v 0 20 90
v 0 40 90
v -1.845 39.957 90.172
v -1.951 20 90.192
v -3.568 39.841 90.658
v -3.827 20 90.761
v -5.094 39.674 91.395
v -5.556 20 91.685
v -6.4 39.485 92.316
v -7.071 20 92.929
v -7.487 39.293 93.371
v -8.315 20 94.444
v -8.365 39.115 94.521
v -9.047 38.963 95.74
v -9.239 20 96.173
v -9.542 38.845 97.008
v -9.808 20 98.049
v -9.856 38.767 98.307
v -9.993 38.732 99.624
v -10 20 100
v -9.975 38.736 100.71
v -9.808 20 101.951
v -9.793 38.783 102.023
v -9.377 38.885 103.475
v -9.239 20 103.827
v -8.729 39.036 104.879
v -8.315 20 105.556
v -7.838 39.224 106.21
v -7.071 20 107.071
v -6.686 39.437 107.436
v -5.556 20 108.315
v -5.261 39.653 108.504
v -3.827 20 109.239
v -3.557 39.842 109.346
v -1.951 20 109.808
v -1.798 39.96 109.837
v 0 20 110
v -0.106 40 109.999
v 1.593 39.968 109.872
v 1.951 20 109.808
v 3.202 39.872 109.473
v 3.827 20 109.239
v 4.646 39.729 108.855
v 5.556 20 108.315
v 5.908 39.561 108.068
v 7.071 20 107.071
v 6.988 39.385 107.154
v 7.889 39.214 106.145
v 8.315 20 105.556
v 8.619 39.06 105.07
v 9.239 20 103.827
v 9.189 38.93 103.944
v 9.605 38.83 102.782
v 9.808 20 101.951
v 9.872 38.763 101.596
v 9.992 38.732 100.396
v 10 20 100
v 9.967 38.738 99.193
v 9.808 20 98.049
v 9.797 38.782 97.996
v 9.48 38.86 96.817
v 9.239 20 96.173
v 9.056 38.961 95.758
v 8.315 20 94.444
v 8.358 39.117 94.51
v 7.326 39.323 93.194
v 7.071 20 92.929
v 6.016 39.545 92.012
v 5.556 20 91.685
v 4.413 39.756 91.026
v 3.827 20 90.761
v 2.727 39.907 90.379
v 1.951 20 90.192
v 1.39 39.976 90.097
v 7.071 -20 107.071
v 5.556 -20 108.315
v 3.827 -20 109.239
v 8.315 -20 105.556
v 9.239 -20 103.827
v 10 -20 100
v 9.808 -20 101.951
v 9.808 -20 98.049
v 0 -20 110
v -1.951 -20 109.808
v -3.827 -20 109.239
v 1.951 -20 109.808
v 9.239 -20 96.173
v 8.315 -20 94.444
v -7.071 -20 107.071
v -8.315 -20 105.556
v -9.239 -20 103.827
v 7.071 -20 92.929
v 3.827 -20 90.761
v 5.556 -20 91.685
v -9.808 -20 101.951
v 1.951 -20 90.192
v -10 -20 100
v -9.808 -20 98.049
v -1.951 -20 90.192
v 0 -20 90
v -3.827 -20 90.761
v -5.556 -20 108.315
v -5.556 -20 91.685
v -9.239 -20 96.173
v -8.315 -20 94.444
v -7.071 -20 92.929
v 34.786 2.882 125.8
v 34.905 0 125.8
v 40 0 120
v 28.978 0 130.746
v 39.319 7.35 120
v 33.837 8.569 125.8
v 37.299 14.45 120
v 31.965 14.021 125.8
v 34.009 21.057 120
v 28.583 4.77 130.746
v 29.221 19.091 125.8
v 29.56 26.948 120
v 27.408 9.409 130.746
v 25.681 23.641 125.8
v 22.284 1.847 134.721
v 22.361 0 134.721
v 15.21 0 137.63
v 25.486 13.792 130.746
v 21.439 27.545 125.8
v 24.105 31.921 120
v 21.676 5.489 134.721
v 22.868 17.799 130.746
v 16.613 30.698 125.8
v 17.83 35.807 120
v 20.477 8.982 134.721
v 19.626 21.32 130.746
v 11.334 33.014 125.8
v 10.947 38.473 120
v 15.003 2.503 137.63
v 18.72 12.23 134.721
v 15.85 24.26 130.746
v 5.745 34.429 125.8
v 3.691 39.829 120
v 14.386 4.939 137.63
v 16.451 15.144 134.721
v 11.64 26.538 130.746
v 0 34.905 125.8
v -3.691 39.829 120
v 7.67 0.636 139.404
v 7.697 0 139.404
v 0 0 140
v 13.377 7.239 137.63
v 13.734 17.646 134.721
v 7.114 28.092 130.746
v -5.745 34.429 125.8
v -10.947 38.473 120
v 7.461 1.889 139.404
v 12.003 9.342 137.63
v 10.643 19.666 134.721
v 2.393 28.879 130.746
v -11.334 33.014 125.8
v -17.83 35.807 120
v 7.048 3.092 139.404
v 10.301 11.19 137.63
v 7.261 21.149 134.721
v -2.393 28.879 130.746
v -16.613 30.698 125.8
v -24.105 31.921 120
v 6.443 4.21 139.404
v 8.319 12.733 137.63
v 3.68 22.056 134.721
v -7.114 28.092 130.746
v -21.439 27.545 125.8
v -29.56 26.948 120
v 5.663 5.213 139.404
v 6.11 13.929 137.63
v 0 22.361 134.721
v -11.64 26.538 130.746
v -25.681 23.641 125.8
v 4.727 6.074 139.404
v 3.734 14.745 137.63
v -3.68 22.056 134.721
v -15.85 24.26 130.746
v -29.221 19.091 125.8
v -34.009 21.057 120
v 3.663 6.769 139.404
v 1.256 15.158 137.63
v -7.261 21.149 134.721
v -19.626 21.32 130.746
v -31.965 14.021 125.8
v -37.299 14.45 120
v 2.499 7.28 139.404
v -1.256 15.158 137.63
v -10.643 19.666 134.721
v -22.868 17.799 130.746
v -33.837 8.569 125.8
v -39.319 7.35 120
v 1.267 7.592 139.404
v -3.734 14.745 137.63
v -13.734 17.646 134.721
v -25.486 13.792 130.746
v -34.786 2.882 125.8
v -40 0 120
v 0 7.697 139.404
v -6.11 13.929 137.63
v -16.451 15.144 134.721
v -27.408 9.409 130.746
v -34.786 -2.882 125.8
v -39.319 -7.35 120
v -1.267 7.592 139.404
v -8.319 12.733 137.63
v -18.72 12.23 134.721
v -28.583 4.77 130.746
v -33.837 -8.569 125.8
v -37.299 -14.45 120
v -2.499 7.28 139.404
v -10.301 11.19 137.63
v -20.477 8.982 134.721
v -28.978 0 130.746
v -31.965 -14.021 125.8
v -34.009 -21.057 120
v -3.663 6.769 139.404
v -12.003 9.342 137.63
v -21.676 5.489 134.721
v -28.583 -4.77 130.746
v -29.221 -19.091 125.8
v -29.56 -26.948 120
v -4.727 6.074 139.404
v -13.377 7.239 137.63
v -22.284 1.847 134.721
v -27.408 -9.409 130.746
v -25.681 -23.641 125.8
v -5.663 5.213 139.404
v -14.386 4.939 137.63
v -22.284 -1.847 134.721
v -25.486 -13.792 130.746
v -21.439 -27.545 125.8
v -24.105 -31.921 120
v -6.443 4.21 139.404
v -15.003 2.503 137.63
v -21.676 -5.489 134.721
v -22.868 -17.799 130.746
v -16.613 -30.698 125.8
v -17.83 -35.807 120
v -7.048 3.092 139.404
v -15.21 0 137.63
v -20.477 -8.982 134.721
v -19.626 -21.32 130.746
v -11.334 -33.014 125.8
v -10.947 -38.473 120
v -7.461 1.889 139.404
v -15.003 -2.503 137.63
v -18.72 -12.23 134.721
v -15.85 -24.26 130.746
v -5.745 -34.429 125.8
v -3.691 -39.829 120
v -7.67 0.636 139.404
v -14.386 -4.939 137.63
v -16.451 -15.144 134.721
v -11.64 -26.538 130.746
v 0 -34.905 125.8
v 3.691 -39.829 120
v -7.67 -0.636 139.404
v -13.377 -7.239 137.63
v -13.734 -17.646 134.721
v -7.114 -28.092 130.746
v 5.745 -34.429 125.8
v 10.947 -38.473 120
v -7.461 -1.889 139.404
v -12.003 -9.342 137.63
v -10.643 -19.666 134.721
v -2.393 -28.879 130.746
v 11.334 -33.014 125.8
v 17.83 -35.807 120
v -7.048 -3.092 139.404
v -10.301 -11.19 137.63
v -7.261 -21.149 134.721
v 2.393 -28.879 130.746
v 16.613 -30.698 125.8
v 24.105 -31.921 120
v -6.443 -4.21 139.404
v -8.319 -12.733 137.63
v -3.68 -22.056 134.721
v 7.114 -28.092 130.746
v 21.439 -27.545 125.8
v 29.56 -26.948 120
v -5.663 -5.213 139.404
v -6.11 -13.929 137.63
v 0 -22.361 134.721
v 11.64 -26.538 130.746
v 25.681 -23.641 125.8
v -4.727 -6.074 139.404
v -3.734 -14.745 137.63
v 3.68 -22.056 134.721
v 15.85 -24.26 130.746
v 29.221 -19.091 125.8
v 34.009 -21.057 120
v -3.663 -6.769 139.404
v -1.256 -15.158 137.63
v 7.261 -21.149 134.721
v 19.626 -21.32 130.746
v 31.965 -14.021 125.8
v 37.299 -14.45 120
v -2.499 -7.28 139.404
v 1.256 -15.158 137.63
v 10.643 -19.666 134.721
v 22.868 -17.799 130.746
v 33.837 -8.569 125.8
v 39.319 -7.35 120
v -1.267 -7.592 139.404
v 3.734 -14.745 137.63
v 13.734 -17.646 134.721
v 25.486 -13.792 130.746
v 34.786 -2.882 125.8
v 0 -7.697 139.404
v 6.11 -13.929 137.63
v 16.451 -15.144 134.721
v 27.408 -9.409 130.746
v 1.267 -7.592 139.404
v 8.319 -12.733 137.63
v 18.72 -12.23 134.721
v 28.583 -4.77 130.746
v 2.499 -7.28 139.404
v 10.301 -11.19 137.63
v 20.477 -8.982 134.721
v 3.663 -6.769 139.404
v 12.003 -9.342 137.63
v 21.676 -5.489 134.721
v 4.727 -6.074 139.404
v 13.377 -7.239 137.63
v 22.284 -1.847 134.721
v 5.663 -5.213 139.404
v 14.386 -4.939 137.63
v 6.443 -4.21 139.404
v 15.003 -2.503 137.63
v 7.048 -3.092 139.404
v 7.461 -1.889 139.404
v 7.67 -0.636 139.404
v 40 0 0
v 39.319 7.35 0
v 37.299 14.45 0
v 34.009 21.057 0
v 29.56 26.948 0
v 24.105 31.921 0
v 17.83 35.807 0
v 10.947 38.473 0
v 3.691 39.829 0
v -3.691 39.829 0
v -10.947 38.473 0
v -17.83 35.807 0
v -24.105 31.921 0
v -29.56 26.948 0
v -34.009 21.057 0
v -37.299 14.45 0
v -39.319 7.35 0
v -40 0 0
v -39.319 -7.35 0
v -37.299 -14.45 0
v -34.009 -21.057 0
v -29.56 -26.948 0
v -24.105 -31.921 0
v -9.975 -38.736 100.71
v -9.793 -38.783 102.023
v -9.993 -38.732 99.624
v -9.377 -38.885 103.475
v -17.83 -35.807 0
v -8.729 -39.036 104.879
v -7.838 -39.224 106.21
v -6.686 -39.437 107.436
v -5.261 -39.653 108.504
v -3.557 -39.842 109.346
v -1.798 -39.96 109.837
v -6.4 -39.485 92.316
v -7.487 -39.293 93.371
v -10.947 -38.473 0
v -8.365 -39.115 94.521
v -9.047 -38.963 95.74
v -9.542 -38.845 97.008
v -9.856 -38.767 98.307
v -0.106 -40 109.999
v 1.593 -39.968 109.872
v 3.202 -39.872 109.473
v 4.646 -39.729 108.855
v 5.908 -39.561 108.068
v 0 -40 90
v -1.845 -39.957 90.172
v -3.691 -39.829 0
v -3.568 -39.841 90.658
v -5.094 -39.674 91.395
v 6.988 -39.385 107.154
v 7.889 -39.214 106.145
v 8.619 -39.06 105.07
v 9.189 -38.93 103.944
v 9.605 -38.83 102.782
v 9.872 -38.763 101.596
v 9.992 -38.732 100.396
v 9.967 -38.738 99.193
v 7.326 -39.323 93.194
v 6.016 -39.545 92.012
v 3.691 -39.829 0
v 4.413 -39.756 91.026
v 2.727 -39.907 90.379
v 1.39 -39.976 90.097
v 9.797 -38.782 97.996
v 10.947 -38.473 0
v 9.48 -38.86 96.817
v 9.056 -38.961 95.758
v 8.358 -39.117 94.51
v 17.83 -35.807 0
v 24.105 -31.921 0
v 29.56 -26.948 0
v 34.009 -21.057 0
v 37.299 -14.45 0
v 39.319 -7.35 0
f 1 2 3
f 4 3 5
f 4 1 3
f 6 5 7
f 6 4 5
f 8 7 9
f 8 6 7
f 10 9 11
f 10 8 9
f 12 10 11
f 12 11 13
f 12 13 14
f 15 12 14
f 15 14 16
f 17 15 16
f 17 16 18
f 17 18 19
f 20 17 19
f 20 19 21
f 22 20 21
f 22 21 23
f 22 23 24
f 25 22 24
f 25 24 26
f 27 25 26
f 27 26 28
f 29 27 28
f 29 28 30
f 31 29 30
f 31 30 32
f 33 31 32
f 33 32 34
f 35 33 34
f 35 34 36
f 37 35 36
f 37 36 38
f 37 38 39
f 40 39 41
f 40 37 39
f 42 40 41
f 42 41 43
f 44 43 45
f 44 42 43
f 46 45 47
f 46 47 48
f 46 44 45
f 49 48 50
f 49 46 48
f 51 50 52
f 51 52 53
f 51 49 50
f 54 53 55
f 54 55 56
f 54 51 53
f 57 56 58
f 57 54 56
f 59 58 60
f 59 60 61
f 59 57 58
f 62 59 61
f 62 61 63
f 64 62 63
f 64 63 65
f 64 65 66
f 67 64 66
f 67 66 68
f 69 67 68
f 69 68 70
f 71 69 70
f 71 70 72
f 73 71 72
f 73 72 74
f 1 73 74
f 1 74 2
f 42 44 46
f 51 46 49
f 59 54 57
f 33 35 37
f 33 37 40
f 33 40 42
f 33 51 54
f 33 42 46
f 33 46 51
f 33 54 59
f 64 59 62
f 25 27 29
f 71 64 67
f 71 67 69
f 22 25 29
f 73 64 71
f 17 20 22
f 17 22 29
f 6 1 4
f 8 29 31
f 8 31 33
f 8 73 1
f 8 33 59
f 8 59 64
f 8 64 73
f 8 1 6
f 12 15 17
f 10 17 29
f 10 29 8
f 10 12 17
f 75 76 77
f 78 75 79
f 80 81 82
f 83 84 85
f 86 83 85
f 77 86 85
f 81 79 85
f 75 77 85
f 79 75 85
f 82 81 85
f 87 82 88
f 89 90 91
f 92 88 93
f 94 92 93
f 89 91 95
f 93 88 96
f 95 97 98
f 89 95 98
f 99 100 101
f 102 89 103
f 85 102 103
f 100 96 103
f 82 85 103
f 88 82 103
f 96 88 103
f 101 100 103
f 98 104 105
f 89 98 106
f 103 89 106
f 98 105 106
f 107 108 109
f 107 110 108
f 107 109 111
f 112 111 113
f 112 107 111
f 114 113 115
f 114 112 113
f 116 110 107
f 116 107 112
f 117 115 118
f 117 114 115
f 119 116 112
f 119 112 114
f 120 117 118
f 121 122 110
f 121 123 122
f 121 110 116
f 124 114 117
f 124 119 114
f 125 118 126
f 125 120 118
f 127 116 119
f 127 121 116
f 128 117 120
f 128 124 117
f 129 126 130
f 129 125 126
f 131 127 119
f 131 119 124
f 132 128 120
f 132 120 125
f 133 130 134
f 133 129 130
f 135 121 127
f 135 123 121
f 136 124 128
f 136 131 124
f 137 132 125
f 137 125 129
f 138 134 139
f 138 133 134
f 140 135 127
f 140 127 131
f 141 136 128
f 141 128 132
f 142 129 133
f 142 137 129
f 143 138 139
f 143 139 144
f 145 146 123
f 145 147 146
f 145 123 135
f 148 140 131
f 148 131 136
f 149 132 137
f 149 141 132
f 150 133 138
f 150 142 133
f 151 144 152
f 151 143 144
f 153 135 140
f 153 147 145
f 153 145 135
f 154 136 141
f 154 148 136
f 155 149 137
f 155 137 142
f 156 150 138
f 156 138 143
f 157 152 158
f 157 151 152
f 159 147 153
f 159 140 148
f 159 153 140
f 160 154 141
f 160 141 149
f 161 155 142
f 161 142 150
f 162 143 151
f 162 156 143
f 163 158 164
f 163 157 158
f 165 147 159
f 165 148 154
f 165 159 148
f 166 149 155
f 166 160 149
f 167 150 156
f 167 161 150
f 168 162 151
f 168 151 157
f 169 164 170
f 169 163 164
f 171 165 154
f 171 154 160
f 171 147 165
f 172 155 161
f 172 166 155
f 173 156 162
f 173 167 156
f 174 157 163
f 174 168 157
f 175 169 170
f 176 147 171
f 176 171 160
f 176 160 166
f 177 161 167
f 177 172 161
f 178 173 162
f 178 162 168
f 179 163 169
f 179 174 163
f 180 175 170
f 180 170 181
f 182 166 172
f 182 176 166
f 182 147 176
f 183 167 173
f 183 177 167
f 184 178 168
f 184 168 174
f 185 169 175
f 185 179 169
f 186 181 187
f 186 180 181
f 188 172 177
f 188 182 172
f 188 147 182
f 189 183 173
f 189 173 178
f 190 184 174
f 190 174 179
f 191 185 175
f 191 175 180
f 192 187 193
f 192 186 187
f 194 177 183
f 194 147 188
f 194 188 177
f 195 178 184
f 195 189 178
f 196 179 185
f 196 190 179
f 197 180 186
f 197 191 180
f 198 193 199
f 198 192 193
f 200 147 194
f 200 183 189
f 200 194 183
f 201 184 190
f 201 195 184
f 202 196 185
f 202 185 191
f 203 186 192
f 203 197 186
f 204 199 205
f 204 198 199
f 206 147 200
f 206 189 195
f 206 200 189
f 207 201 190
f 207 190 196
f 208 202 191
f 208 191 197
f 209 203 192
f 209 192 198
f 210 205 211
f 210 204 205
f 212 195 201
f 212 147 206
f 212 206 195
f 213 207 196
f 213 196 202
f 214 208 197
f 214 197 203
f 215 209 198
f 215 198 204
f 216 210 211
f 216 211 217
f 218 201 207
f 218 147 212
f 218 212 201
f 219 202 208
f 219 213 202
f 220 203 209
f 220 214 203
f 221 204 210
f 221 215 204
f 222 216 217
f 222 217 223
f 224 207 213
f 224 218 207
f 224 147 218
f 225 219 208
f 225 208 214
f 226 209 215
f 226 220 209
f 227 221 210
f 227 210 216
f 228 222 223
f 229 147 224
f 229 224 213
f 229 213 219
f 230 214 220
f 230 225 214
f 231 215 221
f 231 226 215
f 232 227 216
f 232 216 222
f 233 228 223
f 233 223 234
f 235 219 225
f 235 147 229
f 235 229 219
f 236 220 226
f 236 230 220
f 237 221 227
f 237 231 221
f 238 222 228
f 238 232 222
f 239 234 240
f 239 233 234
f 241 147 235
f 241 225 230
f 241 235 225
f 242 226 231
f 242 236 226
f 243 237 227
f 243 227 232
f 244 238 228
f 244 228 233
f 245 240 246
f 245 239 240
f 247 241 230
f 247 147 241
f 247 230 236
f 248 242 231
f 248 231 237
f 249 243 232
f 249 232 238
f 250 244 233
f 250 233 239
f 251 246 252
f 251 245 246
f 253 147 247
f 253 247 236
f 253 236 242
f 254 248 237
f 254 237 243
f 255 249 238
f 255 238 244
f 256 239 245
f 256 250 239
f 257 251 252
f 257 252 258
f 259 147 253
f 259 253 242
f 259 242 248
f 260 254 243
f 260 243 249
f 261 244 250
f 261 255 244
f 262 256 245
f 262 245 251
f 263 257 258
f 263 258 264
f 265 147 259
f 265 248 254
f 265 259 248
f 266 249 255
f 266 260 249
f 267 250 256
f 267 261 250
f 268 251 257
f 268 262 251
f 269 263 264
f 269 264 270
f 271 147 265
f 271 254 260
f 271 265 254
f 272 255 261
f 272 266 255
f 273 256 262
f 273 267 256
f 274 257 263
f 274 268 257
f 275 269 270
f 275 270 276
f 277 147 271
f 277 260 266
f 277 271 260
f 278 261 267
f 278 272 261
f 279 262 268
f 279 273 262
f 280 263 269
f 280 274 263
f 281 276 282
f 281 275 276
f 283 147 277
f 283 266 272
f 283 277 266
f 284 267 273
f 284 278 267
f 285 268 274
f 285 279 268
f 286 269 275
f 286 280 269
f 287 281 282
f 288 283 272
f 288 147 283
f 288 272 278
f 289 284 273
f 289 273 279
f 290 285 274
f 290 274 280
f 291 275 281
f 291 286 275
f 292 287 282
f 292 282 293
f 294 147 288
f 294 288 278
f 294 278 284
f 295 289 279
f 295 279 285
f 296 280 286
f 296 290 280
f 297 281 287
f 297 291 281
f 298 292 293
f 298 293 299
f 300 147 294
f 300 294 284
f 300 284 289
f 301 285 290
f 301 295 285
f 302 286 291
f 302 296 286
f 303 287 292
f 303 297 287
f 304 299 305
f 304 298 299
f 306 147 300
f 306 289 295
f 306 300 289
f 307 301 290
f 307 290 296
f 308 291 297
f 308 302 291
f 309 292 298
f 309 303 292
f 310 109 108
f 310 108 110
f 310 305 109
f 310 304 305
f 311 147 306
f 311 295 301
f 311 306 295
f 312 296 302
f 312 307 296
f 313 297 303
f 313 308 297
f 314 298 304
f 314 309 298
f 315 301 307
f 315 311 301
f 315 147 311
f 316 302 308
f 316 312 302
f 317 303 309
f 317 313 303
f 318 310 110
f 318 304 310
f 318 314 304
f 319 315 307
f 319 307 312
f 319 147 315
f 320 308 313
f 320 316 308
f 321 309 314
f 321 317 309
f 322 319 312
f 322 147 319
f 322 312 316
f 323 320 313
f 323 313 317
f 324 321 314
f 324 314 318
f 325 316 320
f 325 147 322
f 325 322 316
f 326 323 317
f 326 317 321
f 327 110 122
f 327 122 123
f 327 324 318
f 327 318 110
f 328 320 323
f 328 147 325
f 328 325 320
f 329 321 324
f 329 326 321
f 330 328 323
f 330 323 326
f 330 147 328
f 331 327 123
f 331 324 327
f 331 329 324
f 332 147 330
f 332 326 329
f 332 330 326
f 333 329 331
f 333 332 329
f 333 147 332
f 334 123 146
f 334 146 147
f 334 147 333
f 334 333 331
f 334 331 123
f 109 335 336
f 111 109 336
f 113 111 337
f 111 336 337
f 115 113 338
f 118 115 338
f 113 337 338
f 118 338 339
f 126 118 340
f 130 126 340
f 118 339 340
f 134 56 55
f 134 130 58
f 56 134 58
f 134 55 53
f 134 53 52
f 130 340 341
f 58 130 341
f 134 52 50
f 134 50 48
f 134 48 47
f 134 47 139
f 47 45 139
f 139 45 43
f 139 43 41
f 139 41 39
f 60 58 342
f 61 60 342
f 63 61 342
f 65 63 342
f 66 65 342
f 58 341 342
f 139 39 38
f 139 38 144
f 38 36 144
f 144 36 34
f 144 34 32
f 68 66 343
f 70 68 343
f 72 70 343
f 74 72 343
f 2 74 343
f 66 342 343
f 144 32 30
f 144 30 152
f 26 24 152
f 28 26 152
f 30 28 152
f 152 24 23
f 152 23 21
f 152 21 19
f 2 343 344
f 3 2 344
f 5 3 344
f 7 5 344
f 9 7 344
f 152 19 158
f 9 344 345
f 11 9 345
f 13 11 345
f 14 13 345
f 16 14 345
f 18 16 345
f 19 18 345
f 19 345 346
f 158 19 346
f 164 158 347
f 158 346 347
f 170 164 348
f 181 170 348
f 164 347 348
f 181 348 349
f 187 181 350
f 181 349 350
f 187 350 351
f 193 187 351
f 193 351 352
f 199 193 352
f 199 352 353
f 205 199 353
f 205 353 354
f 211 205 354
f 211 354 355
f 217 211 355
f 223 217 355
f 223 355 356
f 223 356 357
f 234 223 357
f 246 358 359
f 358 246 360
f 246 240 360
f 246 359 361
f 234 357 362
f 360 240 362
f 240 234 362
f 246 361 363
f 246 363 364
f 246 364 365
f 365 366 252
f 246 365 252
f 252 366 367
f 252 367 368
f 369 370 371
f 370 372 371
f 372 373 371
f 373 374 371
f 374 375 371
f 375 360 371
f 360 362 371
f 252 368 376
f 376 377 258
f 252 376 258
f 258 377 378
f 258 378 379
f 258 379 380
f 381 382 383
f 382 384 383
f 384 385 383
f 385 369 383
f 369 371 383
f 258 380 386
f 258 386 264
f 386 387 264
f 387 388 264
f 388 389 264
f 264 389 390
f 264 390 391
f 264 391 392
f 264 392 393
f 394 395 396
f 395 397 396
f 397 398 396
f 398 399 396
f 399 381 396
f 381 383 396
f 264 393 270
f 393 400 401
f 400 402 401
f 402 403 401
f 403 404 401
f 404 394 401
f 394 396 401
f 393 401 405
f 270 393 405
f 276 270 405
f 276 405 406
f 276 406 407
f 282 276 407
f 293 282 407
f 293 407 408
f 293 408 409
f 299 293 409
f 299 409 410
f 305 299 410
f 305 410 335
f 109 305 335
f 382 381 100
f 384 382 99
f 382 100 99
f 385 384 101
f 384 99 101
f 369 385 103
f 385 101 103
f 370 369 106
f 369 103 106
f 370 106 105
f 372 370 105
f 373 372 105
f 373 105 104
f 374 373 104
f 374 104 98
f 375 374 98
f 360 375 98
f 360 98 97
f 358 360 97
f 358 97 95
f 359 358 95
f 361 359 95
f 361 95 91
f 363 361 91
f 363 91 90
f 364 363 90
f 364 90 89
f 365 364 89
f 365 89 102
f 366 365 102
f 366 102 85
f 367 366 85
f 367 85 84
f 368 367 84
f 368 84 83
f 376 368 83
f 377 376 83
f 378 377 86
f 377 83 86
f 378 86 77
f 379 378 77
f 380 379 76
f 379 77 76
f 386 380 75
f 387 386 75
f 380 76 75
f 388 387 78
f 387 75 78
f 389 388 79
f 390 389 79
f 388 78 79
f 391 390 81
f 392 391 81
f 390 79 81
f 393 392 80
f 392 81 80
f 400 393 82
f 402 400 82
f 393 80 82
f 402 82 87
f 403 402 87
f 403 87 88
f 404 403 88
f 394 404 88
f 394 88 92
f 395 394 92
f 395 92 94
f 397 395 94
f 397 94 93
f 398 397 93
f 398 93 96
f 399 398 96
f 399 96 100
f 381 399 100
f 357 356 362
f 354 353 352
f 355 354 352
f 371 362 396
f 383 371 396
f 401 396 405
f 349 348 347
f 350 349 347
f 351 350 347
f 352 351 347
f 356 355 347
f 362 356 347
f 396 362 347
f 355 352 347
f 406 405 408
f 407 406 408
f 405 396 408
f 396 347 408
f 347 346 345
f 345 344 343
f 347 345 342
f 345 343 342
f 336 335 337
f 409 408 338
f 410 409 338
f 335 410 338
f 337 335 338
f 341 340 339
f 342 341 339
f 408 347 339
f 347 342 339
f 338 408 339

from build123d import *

# Parameters (mm, degrees)
IZIM1_R                     = 40
Y_KSEKLIK_EKSTR_ZYON1_DEPTH = 120
IZIM2_R                     = 10
KES_EKSTR_ZYON1_DEPTH       = 30
KUBBE1_FACE_RADIUS          = 40
KUBBE1_HEIGHT               = 20


with BuildPart() as part:
    # Çizim1 → Yükseklik-Ekstrüzyon1 (new body)
    with BuildSketch(Plane.XY):
        Circle(IZIM1_R)
    extrude(amount=Y_KSEKLIK_EKSTR_ZYON1_DEPTH)

    # Çizim2 → Kes-Ekstrüzyon1 (cut)
    with BuildSketch(Plane(origin=(0, 20, 0), x_dir=(1, 0, 0), z_dir=(0, 1, 0))):
        with Locations(Location((0, -100, 0), (0, 0, 90))):
            Circle(IZIM2_R)
    kes_ekstr_zyon1 = extrude(amount=KES_EKSTR_ZYON1_DEPTH, mode=Mode.SUBTRACT)

    # Aynalama1: Kes-Ekstrüzyon1 across plane
    add(kes_ekstr_zyon1.mirror(Plane.ZX), mode=Mode.SUBTRACT)

    # Kubbe1: a dome of height H over a round flat face of radius A is a cap of a sphere of radius (A * A + H * H) / (2 * H)
    kubbe1_r = (KUBBE1_FACE_RADIUS * KUBBE1_FACE_RADIUS + KUBBE1_HEIGHT * KUBBE1_HEIGHT) / (2 * KUBBE1_HEIGHT)
    kubbe1_base = Plane((0, 0, 120), z_dir=(0, 0, 1))
    with Locations(kubbe1_base.offset(KUBBE1_HEIGHT - kubbe1_r)):
        kubbe1_ball = Sphere(kubbe1_r, mode=Mode.PRIVATE)
    add(split(kubbe1_ball, bisect_by=kubbe1_base, keep=Keep.TOP, mode=Mode.PRIVATE))


solid = part.part
